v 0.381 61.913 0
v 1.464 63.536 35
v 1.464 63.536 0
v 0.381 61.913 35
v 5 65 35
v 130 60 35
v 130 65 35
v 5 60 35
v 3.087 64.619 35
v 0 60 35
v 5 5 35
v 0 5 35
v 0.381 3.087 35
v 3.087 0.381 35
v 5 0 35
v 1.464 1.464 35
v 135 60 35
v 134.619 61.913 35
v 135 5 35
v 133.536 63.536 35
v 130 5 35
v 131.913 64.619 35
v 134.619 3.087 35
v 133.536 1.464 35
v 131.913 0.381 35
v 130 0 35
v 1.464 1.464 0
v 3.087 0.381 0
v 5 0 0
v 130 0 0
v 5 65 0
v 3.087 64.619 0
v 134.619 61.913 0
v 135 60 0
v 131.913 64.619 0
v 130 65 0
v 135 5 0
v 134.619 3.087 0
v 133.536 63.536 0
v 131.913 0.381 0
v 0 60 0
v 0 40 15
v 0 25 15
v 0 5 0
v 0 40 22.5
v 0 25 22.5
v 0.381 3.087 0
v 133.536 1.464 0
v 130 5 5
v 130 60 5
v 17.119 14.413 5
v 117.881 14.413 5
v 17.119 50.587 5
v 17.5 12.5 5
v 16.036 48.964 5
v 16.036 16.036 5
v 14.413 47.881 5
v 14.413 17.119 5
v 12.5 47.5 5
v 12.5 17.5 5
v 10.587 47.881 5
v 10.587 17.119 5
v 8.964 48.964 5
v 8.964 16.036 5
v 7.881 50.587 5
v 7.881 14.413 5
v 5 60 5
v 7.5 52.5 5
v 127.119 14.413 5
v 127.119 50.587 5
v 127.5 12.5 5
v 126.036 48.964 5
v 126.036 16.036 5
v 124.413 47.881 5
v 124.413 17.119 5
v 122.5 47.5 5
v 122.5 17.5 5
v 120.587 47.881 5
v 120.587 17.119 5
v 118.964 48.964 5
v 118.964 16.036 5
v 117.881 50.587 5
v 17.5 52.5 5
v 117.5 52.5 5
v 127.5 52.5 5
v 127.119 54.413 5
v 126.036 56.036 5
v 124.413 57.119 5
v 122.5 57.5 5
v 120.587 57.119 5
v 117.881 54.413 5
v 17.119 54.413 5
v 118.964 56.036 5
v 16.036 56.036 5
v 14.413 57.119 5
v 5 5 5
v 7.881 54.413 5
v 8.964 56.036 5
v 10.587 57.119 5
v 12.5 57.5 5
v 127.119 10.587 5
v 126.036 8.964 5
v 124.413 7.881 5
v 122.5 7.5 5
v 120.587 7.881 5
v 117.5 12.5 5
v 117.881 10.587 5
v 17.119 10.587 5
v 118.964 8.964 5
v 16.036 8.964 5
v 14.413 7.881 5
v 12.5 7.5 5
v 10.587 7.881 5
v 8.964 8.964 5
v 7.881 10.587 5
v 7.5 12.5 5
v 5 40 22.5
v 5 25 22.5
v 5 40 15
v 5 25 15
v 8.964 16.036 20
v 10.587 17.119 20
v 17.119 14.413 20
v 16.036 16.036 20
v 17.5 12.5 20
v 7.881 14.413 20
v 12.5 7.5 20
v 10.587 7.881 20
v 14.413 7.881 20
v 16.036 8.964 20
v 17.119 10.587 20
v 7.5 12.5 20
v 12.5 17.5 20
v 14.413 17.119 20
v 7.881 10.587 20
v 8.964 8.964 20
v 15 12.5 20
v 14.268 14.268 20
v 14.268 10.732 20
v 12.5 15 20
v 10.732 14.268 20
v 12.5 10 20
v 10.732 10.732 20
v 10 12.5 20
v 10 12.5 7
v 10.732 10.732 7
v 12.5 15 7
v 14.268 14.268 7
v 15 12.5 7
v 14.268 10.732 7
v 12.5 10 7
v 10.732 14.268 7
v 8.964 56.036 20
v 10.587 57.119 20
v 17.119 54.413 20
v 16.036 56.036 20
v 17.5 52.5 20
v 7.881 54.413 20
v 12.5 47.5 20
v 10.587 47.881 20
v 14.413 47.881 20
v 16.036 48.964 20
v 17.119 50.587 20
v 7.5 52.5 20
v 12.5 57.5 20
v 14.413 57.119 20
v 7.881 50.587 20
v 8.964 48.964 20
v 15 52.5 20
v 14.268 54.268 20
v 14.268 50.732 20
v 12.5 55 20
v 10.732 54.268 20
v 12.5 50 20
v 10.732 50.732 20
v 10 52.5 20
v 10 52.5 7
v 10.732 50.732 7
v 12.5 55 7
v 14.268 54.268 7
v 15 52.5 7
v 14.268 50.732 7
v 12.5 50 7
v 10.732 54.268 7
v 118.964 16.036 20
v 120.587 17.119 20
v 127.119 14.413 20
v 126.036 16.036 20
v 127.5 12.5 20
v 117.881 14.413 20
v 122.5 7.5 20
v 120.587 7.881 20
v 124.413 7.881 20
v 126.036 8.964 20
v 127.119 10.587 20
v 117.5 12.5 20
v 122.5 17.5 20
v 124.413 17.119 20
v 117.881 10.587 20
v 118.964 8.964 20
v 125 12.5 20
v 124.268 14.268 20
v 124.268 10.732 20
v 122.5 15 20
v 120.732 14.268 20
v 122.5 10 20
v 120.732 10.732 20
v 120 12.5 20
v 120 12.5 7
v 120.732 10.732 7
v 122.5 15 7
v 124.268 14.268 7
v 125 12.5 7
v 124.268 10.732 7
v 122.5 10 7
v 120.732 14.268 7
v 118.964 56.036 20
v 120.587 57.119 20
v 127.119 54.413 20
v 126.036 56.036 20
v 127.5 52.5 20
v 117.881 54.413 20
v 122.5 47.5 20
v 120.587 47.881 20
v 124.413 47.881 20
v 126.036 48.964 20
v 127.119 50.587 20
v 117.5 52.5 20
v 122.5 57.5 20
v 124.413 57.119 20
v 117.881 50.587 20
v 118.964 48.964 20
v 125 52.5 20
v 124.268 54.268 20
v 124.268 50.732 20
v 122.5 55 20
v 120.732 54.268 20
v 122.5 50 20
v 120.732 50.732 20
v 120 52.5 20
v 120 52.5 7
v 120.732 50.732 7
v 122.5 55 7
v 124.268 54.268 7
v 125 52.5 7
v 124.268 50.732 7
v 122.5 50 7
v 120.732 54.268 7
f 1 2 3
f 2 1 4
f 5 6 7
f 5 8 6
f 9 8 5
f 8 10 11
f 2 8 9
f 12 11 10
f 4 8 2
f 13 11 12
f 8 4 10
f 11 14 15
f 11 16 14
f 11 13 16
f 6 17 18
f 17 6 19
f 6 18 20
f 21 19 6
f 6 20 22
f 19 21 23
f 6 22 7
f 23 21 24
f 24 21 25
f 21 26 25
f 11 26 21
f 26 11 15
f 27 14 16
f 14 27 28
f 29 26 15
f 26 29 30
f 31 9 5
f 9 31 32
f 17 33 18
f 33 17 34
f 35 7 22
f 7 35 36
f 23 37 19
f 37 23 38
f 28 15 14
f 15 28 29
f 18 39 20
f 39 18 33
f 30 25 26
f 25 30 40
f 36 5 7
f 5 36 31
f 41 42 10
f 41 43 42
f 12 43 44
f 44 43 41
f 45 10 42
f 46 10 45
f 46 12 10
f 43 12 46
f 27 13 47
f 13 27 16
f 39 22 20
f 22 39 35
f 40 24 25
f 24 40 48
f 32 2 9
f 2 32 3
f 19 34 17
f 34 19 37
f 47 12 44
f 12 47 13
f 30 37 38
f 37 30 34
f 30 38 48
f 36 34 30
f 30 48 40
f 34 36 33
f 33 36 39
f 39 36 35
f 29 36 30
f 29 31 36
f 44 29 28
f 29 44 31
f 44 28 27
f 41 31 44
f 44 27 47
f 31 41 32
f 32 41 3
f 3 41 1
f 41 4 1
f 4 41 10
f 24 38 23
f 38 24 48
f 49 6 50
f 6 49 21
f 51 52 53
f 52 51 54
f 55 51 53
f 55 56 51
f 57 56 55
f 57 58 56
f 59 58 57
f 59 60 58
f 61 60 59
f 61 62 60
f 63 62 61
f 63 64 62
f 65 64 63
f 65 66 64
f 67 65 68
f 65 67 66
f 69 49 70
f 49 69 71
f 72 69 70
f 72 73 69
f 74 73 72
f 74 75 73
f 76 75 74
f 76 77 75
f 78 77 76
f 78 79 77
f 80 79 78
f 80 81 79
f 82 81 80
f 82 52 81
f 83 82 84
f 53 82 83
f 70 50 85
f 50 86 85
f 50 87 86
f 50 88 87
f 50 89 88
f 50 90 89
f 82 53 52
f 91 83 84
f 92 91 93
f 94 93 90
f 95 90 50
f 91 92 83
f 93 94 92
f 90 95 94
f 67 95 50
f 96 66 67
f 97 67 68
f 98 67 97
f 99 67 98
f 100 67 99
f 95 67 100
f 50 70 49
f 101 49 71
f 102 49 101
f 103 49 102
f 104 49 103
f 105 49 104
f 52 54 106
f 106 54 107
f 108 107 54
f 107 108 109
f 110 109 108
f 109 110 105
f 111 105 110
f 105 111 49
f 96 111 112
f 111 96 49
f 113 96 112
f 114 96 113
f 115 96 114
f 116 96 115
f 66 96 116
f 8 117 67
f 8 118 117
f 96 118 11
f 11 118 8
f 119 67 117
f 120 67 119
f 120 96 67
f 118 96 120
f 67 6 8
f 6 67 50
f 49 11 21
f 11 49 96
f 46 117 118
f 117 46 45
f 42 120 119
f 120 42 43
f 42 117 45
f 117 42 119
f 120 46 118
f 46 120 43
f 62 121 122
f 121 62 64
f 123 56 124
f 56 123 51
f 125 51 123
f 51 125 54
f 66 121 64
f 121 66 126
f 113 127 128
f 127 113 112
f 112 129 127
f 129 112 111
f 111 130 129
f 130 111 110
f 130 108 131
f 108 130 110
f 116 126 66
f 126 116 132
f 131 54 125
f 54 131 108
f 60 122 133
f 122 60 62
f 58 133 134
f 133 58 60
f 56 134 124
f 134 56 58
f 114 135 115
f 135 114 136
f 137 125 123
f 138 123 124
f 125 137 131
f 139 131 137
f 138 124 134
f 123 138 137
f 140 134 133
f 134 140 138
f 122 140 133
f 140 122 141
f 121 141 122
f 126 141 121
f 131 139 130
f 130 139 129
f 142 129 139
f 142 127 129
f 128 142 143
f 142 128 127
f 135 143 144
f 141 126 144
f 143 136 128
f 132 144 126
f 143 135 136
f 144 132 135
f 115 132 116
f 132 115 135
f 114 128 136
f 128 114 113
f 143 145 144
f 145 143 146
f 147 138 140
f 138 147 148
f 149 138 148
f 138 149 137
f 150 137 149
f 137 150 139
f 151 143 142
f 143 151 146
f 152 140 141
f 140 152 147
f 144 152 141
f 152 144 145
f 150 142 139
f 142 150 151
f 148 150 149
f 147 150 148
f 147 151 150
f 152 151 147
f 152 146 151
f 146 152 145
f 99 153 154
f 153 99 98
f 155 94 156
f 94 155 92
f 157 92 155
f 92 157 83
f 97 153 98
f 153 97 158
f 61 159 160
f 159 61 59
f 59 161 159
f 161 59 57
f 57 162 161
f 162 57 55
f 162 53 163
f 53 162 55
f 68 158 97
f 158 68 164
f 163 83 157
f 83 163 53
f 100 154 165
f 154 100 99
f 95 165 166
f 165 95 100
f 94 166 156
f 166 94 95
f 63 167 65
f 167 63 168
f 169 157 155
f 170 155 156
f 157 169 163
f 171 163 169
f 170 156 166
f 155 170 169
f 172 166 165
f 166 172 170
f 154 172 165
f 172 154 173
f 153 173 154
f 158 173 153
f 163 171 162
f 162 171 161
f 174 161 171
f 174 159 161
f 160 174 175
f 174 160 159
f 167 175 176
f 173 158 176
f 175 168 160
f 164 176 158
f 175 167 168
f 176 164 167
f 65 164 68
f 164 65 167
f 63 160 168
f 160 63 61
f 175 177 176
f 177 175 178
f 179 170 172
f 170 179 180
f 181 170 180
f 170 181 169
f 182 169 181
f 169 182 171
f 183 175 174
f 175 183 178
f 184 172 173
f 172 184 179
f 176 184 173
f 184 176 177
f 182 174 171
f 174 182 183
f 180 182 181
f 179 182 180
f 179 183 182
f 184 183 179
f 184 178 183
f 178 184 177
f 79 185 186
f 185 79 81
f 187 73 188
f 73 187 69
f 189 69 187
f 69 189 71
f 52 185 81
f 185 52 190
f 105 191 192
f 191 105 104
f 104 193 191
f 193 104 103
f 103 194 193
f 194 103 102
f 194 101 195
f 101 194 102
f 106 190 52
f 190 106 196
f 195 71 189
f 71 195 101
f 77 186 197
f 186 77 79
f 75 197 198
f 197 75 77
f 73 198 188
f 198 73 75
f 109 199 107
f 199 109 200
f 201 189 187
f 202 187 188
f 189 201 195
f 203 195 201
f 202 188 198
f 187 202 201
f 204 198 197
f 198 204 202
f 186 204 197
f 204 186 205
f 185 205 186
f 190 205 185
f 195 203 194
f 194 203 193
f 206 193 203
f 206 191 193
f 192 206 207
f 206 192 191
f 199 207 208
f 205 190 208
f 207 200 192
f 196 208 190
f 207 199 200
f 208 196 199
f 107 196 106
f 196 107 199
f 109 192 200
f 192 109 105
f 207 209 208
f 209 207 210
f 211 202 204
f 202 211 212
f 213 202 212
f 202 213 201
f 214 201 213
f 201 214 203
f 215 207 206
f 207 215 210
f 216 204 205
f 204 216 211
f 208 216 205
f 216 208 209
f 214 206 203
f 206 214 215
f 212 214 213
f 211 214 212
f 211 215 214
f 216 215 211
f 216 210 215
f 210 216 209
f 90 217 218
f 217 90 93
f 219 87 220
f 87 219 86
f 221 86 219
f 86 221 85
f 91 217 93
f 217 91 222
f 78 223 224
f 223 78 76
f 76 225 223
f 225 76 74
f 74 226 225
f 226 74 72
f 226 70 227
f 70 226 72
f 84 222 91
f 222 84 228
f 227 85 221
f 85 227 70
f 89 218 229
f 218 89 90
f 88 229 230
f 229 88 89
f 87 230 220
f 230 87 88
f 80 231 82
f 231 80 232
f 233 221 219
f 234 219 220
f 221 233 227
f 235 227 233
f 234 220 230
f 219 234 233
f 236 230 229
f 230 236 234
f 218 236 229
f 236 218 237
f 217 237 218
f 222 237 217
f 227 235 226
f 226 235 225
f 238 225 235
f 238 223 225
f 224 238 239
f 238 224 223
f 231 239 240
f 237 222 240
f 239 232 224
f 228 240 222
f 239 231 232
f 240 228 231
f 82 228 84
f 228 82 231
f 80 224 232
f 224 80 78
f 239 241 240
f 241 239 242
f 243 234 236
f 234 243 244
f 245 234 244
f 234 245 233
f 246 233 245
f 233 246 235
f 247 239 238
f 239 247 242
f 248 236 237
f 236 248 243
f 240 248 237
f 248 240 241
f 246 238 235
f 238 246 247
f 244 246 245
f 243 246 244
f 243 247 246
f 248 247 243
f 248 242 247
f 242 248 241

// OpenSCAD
difference() {
    hull() {
        translate([5,5,0]) {
            cylinder(35, r=5);
        }
        translate([130,5,0]) {
            cylinder(35, r=5);
        }
        translate([130,60,0]) {
            cylinder(35, r=5);
        }
        translate([5,60,0]) {
            cylinder(35, r=5);
        }
    }
    translate([5, 5, 5]){
        cube([125, 55, 35]);
    }
    translate([-1, 25, 15]) {
       cube([15, 15, 7.5]);
    }
}
 

peg(10+2.5, 10+2.5, 2);
peg(10+2.5, 50+2.5, 2);
peg(120+2.5, 10+2.5, 2);
peg(120+2.5, 50+2.5, 2);

module peg(x, y, z,) {
    translate([x, y, z]) {
        difference() {
            cylinder(18, r=5);
            translate([0,0,5]){
                cylinder(15, r=2.5);
            }
        }
    }
}
